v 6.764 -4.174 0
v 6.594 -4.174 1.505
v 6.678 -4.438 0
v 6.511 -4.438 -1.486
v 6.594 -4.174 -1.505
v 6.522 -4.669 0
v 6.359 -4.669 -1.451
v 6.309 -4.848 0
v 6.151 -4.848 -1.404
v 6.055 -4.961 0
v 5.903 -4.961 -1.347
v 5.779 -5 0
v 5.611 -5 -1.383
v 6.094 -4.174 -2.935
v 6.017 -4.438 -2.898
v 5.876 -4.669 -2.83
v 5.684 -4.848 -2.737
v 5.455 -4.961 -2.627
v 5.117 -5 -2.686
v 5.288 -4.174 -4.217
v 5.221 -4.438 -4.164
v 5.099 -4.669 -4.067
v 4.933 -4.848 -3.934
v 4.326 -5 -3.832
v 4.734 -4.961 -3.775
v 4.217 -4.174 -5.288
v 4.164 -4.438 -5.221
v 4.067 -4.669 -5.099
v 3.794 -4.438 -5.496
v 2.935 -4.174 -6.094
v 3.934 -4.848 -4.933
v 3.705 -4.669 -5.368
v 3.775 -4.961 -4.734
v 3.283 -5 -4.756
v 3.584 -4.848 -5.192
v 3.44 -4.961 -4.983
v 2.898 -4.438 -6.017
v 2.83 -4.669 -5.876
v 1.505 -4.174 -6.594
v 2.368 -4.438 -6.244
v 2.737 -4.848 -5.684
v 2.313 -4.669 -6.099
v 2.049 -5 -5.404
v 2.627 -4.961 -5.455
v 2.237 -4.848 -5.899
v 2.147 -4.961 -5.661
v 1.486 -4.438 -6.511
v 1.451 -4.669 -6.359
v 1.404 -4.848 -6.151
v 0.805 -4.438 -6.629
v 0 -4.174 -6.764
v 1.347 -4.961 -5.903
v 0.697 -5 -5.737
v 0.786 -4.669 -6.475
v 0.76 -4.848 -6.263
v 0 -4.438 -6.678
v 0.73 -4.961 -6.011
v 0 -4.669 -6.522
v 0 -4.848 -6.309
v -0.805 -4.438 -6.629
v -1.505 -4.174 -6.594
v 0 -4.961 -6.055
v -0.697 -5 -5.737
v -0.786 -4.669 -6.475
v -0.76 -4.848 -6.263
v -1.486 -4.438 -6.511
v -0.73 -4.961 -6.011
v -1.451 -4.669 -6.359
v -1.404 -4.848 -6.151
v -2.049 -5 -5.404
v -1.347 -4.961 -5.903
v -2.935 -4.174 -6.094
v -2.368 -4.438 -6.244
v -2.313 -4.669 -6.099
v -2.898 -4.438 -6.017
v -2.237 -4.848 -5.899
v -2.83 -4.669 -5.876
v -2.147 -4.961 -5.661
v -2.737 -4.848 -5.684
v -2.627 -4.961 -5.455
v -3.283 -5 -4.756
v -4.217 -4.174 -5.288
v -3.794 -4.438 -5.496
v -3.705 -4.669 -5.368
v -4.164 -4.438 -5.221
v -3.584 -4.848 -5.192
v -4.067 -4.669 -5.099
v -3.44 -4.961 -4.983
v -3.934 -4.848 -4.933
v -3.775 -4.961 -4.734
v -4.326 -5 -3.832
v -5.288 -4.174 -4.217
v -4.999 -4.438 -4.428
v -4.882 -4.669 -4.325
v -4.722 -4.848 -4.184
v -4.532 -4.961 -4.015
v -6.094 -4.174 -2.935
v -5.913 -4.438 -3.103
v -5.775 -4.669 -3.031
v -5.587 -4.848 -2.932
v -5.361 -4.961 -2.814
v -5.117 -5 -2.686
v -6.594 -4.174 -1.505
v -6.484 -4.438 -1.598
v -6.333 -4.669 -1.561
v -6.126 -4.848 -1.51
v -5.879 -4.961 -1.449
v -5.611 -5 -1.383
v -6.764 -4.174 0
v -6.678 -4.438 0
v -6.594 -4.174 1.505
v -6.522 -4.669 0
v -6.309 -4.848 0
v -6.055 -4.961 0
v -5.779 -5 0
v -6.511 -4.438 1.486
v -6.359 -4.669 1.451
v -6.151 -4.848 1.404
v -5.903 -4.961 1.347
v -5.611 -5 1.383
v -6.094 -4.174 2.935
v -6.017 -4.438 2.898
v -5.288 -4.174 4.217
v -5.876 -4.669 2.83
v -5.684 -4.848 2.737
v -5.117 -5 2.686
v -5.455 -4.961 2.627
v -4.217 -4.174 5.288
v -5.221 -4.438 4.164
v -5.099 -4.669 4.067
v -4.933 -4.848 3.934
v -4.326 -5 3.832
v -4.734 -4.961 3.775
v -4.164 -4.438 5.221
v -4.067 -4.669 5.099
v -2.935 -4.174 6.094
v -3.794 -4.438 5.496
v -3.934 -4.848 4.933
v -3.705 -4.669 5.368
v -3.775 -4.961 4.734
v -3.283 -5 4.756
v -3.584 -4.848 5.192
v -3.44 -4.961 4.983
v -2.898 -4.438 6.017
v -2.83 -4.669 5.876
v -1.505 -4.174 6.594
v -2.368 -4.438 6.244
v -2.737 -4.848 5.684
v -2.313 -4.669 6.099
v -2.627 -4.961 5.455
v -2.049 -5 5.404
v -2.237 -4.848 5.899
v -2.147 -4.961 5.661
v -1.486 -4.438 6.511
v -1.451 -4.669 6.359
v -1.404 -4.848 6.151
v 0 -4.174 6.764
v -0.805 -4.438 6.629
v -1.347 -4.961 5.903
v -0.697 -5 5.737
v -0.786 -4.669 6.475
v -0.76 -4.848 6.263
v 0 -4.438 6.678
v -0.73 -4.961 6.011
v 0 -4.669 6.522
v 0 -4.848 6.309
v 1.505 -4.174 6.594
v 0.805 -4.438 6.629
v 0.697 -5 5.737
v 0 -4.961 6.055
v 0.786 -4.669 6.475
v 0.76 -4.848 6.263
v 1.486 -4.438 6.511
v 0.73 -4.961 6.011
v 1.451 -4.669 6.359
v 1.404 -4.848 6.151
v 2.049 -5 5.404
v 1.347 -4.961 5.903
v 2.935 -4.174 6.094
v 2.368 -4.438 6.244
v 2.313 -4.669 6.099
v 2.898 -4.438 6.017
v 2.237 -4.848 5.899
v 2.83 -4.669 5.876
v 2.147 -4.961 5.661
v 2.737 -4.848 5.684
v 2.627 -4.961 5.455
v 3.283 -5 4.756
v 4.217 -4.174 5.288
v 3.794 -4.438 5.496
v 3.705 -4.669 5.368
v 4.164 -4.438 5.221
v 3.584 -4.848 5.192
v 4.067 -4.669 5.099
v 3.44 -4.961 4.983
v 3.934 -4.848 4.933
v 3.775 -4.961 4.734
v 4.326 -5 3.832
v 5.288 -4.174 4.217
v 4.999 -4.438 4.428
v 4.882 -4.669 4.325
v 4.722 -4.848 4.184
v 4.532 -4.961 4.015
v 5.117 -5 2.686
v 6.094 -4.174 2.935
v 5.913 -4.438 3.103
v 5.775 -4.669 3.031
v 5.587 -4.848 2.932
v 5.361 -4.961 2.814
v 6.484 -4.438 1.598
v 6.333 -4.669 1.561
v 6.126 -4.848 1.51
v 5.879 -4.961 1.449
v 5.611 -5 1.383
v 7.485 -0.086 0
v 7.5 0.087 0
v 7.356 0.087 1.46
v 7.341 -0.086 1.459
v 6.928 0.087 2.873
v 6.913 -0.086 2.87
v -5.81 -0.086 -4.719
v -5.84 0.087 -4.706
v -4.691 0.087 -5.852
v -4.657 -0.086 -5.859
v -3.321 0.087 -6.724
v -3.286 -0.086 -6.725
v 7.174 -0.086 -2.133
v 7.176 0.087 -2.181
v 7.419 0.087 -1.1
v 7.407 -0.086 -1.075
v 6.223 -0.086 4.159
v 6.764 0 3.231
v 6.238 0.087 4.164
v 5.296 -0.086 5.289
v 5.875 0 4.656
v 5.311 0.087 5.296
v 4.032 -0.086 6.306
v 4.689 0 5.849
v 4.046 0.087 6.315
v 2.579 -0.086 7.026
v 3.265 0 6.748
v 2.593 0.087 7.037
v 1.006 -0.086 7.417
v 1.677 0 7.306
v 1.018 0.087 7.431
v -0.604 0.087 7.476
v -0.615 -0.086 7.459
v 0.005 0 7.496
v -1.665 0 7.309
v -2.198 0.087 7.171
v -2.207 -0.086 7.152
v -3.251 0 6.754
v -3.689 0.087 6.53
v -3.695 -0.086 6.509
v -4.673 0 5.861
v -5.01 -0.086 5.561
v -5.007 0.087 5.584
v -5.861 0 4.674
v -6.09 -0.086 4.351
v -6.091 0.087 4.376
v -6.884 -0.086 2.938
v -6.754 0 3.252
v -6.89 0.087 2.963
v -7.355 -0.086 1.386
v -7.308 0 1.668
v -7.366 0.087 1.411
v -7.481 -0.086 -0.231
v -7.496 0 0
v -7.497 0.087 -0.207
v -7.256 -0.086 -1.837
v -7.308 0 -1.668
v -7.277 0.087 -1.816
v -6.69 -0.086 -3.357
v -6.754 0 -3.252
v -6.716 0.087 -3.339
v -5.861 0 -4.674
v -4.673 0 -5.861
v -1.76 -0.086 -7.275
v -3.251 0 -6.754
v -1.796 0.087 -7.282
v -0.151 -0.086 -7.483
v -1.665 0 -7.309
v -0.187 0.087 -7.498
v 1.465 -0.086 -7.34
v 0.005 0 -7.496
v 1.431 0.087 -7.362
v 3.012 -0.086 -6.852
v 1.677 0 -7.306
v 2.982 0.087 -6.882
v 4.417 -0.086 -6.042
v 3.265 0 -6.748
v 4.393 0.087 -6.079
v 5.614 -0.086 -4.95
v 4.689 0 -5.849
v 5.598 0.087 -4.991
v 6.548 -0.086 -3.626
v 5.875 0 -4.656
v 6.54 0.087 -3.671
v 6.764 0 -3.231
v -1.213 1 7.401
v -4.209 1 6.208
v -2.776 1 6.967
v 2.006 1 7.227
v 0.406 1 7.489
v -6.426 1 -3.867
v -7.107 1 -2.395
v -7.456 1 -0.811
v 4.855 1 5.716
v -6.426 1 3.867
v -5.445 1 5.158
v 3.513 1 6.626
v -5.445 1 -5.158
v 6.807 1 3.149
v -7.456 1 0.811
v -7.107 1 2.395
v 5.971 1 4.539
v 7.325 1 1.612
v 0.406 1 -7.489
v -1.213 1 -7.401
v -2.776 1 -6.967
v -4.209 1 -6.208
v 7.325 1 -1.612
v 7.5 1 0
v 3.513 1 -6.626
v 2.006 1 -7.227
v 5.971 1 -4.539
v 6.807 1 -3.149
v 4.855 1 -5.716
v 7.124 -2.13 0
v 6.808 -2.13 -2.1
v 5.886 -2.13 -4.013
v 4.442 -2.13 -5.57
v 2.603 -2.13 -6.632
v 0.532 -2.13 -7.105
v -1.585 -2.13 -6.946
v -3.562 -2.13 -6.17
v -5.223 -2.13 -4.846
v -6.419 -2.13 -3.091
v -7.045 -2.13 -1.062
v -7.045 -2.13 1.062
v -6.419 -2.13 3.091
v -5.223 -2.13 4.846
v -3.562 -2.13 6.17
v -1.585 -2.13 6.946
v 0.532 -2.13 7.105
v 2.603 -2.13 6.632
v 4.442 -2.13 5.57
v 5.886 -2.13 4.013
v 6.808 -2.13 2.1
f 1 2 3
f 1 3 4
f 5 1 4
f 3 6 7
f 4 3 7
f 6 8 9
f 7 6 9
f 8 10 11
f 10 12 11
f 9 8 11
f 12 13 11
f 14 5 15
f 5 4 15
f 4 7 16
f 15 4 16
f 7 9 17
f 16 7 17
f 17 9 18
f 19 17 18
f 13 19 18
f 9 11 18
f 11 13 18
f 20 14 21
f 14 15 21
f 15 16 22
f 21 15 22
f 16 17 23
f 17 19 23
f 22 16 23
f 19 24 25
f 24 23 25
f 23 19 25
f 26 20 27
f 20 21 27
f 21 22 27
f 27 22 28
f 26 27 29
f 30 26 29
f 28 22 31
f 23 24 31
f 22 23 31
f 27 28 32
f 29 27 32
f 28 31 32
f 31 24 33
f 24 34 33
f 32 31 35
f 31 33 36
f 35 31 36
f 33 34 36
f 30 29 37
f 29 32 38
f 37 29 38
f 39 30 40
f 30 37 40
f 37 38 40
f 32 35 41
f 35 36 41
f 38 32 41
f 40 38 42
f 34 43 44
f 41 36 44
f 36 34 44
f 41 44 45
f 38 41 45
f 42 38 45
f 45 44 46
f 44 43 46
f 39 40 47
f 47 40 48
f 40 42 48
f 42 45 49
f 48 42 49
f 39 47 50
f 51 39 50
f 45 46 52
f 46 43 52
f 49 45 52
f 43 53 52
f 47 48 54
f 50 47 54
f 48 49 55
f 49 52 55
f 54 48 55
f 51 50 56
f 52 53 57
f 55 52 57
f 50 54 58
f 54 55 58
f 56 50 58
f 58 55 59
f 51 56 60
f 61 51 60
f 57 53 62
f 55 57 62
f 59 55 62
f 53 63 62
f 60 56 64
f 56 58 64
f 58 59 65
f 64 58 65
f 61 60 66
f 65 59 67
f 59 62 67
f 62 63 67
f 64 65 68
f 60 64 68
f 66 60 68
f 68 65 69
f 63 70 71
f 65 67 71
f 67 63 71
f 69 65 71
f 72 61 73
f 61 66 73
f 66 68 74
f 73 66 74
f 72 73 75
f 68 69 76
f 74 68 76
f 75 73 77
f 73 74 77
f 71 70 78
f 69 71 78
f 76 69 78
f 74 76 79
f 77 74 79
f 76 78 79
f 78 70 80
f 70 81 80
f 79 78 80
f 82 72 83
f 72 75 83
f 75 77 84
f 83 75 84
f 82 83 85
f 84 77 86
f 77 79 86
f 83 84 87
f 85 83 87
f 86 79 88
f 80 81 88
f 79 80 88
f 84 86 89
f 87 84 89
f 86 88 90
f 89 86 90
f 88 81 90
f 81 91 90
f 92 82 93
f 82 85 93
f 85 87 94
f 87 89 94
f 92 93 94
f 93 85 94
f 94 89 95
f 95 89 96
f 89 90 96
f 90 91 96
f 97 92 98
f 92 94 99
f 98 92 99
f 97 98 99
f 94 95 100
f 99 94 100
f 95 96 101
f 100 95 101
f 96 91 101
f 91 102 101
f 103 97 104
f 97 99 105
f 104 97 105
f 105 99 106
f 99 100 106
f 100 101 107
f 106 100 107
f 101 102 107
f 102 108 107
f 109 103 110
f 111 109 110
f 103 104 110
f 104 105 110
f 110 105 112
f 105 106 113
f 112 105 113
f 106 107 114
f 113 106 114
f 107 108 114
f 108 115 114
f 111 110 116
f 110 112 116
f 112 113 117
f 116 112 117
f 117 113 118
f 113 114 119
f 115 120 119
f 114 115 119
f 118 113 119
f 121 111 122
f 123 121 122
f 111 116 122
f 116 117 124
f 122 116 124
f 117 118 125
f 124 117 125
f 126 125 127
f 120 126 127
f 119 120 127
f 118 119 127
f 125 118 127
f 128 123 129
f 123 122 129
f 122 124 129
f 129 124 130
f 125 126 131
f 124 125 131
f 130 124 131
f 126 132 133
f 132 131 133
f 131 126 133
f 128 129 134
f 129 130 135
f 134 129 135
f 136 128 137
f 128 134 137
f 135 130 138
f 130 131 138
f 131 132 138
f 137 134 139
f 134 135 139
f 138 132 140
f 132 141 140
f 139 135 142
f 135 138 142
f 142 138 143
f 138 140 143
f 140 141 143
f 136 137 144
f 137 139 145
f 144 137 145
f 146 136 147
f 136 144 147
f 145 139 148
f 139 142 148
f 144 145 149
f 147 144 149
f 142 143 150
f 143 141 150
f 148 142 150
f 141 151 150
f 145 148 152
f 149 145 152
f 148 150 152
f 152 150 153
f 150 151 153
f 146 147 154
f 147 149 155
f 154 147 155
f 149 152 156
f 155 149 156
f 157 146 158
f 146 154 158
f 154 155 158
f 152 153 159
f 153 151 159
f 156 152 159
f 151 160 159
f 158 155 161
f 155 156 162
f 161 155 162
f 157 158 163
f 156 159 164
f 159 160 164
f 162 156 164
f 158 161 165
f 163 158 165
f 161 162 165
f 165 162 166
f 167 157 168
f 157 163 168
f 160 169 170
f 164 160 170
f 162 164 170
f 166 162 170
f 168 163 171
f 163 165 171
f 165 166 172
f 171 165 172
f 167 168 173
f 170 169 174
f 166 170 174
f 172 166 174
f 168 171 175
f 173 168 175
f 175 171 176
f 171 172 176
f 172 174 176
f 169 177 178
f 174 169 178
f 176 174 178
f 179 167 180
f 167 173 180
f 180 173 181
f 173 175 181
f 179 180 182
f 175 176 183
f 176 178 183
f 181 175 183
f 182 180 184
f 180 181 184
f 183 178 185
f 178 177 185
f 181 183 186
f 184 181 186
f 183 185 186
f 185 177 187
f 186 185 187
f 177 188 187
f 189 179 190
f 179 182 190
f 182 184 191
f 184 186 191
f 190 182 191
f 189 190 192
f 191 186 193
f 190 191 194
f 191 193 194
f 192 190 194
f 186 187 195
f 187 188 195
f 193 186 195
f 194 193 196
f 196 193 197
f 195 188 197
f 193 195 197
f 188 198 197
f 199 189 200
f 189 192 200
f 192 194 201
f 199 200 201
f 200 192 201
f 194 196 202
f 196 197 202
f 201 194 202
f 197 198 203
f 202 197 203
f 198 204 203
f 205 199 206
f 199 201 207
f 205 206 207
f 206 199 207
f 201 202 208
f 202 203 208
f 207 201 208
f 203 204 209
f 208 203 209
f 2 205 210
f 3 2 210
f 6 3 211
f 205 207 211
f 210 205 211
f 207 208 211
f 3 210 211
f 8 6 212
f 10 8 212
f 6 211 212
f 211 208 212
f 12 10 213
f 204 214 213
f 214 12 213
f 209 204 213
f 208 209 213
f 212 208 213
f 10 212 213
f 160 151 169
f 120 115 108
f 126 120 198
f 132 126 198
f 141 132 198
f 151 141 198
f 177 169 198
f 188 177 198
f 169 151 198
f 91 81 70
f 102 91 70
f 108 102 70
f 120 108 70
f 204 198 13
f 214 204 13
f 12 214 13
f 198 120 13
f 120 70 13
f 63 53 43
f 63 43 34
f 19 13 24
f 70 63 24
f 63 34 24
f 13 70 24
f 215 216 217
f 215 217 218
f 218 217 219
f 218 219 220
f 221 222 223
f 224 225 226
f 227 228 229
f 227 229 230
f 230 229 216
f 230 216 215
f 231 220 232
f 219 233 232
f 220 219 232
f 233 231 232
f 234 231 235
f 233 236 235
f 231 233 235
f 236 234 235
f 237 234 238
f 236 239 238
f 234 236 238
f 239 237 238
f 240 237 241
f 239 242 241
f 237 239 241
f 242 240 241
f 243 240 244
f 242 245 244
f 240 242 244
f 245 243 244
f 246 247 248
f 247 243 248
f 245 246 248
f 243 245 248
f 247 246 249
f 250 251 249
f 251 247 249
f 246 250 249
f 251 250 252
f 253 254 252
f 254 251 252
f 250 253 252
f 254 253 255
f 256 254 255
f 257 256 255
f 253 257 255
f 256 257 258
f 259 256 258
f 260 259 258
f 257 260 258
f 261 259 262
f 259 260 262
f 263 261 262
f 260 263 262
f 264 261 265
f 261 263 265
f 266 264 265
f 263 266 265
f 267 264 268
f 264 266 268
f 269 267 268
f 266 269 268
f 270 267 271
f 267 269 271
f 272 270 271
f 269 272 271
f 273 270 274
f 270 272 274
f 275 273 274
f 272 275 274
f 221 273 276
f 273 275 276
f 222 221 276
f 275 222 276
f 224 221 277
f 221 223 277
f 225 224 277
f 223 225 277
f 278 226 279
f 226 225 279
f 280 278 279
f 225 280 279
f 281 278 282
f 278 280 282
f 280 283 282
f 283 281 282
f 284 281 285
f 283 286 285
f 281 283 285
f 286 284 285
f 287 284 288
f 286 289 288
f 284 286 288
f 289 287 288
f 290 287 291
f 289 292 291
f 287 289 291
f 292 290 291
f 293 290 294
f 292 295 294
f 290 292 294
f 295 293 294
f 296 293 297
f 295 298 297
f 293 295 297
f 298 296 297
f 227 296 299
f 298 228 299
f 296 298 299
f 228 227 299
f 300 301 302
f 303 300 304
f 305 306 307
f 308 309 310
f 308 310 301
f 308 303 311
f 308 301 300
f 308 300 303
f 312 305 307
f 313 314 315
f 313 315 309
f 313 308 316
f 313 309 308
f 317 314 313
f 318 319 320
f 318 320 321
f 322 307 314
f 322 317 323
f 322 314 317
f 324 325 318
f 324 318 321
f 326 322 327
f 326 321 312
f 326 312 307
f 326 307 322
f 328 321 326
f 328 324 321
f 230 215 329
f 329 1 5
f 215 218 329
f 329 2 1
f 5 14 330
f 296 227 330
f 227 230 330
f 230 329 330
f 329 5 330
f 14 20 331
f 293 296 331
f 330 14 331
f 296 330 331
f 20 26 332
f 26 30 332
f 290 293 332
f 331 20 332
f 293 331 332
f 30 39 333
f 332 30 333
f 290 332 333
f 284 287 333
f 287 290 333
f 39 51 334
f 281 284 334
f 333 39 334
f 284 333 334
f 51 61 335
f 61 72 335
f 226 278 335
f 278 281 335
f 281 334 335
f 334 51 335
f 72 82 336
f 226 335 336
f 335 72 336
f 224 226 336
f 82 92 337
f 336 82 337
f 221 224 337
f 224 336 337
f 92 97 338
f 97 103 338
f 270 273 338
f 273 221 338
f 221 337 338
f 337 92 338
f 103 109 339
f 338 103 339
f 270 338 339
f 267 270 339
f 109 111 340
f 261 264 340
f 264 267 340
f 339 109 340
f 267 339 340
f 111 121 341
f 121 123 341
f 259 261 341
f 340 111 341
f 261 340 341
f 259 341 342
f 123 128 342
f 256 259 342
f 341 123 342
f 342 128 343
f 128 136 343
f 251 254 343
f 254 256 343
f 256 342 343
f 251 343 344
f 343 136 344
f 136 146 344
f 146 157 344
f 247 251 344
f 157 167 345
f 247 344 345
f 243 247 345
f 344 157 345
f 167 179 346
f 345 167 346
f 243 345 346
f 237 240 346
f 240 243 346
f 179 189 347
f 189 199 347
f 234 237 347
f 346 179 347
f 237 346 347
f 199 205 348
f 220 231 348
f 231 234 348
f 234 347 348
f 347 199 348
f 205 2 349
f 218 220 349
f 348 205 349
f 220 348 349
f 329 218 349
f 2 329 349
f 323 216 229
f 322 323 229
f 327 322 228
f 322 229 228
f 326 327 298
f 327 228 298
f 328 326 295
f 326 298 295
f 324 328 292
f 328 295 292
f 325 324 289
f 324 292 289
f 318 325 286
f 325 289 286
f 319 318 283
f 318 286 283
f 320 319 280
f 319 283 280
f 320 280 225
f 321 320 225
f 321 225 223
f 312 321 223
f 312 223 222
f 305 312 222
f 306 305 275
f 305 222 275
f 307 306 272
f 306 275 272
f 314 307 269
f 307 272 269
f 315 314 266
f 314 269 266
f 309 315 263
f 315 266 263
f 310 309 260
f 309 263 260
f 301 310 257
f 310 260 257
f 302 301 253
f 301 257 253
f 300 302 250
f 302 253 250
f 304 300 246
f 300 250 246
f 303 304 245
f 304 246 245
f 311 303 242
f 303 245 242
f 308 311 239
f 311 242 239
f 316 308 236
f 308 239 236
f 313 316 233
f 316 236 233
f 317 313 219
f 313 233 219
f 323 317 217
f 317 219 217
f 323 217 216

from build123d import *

# Parameters (mm, degrees)
SKETCH2_R           = 7.5
BOSS_EXTRUDE1_DEPTH = 5
BOSS_EXTRUDE1_TAPER = 10
SKETCH3_R           = 7.5
BOSS_EXTRUDE2_DEPTH = 1
FILLET1_R           = 1


with BuildPart() as part:
    # Sketch2 → Boss-Extrude1 (new body)
    with BuildSketch(Plane(origin=(0, 0, 0), x_dir=(1, 0, 0), z_dir=(0, 1, 0))):
        Circle(SKETCH2_R)
    extrude(amount=-BOSS_EXTRUDE1_DEPTH, taper=BOSS_EXTRUDE1_TAPER)

    # Sketch3 → Boss-Extrude2 (add)
    with BuildSketch(Plane(origin=(0, 0, 0), x_dir=(1, 0, 0), z_dir=(0, 1, 0))):
        Circle(SKETCH3_R)
    extrude(amount=BOSS_EXTRUDE2_DEPTH)

    # Fillet1
    fillet1_edges = [part.edges().sort_by_distance(p)[0] for p in [
        (-7.5, 0, 0),
        (-6.618365096, -5, 0),
    ]]
    fillet(fillet1_edges, radius=FILLET1_R)


solid = part.part
